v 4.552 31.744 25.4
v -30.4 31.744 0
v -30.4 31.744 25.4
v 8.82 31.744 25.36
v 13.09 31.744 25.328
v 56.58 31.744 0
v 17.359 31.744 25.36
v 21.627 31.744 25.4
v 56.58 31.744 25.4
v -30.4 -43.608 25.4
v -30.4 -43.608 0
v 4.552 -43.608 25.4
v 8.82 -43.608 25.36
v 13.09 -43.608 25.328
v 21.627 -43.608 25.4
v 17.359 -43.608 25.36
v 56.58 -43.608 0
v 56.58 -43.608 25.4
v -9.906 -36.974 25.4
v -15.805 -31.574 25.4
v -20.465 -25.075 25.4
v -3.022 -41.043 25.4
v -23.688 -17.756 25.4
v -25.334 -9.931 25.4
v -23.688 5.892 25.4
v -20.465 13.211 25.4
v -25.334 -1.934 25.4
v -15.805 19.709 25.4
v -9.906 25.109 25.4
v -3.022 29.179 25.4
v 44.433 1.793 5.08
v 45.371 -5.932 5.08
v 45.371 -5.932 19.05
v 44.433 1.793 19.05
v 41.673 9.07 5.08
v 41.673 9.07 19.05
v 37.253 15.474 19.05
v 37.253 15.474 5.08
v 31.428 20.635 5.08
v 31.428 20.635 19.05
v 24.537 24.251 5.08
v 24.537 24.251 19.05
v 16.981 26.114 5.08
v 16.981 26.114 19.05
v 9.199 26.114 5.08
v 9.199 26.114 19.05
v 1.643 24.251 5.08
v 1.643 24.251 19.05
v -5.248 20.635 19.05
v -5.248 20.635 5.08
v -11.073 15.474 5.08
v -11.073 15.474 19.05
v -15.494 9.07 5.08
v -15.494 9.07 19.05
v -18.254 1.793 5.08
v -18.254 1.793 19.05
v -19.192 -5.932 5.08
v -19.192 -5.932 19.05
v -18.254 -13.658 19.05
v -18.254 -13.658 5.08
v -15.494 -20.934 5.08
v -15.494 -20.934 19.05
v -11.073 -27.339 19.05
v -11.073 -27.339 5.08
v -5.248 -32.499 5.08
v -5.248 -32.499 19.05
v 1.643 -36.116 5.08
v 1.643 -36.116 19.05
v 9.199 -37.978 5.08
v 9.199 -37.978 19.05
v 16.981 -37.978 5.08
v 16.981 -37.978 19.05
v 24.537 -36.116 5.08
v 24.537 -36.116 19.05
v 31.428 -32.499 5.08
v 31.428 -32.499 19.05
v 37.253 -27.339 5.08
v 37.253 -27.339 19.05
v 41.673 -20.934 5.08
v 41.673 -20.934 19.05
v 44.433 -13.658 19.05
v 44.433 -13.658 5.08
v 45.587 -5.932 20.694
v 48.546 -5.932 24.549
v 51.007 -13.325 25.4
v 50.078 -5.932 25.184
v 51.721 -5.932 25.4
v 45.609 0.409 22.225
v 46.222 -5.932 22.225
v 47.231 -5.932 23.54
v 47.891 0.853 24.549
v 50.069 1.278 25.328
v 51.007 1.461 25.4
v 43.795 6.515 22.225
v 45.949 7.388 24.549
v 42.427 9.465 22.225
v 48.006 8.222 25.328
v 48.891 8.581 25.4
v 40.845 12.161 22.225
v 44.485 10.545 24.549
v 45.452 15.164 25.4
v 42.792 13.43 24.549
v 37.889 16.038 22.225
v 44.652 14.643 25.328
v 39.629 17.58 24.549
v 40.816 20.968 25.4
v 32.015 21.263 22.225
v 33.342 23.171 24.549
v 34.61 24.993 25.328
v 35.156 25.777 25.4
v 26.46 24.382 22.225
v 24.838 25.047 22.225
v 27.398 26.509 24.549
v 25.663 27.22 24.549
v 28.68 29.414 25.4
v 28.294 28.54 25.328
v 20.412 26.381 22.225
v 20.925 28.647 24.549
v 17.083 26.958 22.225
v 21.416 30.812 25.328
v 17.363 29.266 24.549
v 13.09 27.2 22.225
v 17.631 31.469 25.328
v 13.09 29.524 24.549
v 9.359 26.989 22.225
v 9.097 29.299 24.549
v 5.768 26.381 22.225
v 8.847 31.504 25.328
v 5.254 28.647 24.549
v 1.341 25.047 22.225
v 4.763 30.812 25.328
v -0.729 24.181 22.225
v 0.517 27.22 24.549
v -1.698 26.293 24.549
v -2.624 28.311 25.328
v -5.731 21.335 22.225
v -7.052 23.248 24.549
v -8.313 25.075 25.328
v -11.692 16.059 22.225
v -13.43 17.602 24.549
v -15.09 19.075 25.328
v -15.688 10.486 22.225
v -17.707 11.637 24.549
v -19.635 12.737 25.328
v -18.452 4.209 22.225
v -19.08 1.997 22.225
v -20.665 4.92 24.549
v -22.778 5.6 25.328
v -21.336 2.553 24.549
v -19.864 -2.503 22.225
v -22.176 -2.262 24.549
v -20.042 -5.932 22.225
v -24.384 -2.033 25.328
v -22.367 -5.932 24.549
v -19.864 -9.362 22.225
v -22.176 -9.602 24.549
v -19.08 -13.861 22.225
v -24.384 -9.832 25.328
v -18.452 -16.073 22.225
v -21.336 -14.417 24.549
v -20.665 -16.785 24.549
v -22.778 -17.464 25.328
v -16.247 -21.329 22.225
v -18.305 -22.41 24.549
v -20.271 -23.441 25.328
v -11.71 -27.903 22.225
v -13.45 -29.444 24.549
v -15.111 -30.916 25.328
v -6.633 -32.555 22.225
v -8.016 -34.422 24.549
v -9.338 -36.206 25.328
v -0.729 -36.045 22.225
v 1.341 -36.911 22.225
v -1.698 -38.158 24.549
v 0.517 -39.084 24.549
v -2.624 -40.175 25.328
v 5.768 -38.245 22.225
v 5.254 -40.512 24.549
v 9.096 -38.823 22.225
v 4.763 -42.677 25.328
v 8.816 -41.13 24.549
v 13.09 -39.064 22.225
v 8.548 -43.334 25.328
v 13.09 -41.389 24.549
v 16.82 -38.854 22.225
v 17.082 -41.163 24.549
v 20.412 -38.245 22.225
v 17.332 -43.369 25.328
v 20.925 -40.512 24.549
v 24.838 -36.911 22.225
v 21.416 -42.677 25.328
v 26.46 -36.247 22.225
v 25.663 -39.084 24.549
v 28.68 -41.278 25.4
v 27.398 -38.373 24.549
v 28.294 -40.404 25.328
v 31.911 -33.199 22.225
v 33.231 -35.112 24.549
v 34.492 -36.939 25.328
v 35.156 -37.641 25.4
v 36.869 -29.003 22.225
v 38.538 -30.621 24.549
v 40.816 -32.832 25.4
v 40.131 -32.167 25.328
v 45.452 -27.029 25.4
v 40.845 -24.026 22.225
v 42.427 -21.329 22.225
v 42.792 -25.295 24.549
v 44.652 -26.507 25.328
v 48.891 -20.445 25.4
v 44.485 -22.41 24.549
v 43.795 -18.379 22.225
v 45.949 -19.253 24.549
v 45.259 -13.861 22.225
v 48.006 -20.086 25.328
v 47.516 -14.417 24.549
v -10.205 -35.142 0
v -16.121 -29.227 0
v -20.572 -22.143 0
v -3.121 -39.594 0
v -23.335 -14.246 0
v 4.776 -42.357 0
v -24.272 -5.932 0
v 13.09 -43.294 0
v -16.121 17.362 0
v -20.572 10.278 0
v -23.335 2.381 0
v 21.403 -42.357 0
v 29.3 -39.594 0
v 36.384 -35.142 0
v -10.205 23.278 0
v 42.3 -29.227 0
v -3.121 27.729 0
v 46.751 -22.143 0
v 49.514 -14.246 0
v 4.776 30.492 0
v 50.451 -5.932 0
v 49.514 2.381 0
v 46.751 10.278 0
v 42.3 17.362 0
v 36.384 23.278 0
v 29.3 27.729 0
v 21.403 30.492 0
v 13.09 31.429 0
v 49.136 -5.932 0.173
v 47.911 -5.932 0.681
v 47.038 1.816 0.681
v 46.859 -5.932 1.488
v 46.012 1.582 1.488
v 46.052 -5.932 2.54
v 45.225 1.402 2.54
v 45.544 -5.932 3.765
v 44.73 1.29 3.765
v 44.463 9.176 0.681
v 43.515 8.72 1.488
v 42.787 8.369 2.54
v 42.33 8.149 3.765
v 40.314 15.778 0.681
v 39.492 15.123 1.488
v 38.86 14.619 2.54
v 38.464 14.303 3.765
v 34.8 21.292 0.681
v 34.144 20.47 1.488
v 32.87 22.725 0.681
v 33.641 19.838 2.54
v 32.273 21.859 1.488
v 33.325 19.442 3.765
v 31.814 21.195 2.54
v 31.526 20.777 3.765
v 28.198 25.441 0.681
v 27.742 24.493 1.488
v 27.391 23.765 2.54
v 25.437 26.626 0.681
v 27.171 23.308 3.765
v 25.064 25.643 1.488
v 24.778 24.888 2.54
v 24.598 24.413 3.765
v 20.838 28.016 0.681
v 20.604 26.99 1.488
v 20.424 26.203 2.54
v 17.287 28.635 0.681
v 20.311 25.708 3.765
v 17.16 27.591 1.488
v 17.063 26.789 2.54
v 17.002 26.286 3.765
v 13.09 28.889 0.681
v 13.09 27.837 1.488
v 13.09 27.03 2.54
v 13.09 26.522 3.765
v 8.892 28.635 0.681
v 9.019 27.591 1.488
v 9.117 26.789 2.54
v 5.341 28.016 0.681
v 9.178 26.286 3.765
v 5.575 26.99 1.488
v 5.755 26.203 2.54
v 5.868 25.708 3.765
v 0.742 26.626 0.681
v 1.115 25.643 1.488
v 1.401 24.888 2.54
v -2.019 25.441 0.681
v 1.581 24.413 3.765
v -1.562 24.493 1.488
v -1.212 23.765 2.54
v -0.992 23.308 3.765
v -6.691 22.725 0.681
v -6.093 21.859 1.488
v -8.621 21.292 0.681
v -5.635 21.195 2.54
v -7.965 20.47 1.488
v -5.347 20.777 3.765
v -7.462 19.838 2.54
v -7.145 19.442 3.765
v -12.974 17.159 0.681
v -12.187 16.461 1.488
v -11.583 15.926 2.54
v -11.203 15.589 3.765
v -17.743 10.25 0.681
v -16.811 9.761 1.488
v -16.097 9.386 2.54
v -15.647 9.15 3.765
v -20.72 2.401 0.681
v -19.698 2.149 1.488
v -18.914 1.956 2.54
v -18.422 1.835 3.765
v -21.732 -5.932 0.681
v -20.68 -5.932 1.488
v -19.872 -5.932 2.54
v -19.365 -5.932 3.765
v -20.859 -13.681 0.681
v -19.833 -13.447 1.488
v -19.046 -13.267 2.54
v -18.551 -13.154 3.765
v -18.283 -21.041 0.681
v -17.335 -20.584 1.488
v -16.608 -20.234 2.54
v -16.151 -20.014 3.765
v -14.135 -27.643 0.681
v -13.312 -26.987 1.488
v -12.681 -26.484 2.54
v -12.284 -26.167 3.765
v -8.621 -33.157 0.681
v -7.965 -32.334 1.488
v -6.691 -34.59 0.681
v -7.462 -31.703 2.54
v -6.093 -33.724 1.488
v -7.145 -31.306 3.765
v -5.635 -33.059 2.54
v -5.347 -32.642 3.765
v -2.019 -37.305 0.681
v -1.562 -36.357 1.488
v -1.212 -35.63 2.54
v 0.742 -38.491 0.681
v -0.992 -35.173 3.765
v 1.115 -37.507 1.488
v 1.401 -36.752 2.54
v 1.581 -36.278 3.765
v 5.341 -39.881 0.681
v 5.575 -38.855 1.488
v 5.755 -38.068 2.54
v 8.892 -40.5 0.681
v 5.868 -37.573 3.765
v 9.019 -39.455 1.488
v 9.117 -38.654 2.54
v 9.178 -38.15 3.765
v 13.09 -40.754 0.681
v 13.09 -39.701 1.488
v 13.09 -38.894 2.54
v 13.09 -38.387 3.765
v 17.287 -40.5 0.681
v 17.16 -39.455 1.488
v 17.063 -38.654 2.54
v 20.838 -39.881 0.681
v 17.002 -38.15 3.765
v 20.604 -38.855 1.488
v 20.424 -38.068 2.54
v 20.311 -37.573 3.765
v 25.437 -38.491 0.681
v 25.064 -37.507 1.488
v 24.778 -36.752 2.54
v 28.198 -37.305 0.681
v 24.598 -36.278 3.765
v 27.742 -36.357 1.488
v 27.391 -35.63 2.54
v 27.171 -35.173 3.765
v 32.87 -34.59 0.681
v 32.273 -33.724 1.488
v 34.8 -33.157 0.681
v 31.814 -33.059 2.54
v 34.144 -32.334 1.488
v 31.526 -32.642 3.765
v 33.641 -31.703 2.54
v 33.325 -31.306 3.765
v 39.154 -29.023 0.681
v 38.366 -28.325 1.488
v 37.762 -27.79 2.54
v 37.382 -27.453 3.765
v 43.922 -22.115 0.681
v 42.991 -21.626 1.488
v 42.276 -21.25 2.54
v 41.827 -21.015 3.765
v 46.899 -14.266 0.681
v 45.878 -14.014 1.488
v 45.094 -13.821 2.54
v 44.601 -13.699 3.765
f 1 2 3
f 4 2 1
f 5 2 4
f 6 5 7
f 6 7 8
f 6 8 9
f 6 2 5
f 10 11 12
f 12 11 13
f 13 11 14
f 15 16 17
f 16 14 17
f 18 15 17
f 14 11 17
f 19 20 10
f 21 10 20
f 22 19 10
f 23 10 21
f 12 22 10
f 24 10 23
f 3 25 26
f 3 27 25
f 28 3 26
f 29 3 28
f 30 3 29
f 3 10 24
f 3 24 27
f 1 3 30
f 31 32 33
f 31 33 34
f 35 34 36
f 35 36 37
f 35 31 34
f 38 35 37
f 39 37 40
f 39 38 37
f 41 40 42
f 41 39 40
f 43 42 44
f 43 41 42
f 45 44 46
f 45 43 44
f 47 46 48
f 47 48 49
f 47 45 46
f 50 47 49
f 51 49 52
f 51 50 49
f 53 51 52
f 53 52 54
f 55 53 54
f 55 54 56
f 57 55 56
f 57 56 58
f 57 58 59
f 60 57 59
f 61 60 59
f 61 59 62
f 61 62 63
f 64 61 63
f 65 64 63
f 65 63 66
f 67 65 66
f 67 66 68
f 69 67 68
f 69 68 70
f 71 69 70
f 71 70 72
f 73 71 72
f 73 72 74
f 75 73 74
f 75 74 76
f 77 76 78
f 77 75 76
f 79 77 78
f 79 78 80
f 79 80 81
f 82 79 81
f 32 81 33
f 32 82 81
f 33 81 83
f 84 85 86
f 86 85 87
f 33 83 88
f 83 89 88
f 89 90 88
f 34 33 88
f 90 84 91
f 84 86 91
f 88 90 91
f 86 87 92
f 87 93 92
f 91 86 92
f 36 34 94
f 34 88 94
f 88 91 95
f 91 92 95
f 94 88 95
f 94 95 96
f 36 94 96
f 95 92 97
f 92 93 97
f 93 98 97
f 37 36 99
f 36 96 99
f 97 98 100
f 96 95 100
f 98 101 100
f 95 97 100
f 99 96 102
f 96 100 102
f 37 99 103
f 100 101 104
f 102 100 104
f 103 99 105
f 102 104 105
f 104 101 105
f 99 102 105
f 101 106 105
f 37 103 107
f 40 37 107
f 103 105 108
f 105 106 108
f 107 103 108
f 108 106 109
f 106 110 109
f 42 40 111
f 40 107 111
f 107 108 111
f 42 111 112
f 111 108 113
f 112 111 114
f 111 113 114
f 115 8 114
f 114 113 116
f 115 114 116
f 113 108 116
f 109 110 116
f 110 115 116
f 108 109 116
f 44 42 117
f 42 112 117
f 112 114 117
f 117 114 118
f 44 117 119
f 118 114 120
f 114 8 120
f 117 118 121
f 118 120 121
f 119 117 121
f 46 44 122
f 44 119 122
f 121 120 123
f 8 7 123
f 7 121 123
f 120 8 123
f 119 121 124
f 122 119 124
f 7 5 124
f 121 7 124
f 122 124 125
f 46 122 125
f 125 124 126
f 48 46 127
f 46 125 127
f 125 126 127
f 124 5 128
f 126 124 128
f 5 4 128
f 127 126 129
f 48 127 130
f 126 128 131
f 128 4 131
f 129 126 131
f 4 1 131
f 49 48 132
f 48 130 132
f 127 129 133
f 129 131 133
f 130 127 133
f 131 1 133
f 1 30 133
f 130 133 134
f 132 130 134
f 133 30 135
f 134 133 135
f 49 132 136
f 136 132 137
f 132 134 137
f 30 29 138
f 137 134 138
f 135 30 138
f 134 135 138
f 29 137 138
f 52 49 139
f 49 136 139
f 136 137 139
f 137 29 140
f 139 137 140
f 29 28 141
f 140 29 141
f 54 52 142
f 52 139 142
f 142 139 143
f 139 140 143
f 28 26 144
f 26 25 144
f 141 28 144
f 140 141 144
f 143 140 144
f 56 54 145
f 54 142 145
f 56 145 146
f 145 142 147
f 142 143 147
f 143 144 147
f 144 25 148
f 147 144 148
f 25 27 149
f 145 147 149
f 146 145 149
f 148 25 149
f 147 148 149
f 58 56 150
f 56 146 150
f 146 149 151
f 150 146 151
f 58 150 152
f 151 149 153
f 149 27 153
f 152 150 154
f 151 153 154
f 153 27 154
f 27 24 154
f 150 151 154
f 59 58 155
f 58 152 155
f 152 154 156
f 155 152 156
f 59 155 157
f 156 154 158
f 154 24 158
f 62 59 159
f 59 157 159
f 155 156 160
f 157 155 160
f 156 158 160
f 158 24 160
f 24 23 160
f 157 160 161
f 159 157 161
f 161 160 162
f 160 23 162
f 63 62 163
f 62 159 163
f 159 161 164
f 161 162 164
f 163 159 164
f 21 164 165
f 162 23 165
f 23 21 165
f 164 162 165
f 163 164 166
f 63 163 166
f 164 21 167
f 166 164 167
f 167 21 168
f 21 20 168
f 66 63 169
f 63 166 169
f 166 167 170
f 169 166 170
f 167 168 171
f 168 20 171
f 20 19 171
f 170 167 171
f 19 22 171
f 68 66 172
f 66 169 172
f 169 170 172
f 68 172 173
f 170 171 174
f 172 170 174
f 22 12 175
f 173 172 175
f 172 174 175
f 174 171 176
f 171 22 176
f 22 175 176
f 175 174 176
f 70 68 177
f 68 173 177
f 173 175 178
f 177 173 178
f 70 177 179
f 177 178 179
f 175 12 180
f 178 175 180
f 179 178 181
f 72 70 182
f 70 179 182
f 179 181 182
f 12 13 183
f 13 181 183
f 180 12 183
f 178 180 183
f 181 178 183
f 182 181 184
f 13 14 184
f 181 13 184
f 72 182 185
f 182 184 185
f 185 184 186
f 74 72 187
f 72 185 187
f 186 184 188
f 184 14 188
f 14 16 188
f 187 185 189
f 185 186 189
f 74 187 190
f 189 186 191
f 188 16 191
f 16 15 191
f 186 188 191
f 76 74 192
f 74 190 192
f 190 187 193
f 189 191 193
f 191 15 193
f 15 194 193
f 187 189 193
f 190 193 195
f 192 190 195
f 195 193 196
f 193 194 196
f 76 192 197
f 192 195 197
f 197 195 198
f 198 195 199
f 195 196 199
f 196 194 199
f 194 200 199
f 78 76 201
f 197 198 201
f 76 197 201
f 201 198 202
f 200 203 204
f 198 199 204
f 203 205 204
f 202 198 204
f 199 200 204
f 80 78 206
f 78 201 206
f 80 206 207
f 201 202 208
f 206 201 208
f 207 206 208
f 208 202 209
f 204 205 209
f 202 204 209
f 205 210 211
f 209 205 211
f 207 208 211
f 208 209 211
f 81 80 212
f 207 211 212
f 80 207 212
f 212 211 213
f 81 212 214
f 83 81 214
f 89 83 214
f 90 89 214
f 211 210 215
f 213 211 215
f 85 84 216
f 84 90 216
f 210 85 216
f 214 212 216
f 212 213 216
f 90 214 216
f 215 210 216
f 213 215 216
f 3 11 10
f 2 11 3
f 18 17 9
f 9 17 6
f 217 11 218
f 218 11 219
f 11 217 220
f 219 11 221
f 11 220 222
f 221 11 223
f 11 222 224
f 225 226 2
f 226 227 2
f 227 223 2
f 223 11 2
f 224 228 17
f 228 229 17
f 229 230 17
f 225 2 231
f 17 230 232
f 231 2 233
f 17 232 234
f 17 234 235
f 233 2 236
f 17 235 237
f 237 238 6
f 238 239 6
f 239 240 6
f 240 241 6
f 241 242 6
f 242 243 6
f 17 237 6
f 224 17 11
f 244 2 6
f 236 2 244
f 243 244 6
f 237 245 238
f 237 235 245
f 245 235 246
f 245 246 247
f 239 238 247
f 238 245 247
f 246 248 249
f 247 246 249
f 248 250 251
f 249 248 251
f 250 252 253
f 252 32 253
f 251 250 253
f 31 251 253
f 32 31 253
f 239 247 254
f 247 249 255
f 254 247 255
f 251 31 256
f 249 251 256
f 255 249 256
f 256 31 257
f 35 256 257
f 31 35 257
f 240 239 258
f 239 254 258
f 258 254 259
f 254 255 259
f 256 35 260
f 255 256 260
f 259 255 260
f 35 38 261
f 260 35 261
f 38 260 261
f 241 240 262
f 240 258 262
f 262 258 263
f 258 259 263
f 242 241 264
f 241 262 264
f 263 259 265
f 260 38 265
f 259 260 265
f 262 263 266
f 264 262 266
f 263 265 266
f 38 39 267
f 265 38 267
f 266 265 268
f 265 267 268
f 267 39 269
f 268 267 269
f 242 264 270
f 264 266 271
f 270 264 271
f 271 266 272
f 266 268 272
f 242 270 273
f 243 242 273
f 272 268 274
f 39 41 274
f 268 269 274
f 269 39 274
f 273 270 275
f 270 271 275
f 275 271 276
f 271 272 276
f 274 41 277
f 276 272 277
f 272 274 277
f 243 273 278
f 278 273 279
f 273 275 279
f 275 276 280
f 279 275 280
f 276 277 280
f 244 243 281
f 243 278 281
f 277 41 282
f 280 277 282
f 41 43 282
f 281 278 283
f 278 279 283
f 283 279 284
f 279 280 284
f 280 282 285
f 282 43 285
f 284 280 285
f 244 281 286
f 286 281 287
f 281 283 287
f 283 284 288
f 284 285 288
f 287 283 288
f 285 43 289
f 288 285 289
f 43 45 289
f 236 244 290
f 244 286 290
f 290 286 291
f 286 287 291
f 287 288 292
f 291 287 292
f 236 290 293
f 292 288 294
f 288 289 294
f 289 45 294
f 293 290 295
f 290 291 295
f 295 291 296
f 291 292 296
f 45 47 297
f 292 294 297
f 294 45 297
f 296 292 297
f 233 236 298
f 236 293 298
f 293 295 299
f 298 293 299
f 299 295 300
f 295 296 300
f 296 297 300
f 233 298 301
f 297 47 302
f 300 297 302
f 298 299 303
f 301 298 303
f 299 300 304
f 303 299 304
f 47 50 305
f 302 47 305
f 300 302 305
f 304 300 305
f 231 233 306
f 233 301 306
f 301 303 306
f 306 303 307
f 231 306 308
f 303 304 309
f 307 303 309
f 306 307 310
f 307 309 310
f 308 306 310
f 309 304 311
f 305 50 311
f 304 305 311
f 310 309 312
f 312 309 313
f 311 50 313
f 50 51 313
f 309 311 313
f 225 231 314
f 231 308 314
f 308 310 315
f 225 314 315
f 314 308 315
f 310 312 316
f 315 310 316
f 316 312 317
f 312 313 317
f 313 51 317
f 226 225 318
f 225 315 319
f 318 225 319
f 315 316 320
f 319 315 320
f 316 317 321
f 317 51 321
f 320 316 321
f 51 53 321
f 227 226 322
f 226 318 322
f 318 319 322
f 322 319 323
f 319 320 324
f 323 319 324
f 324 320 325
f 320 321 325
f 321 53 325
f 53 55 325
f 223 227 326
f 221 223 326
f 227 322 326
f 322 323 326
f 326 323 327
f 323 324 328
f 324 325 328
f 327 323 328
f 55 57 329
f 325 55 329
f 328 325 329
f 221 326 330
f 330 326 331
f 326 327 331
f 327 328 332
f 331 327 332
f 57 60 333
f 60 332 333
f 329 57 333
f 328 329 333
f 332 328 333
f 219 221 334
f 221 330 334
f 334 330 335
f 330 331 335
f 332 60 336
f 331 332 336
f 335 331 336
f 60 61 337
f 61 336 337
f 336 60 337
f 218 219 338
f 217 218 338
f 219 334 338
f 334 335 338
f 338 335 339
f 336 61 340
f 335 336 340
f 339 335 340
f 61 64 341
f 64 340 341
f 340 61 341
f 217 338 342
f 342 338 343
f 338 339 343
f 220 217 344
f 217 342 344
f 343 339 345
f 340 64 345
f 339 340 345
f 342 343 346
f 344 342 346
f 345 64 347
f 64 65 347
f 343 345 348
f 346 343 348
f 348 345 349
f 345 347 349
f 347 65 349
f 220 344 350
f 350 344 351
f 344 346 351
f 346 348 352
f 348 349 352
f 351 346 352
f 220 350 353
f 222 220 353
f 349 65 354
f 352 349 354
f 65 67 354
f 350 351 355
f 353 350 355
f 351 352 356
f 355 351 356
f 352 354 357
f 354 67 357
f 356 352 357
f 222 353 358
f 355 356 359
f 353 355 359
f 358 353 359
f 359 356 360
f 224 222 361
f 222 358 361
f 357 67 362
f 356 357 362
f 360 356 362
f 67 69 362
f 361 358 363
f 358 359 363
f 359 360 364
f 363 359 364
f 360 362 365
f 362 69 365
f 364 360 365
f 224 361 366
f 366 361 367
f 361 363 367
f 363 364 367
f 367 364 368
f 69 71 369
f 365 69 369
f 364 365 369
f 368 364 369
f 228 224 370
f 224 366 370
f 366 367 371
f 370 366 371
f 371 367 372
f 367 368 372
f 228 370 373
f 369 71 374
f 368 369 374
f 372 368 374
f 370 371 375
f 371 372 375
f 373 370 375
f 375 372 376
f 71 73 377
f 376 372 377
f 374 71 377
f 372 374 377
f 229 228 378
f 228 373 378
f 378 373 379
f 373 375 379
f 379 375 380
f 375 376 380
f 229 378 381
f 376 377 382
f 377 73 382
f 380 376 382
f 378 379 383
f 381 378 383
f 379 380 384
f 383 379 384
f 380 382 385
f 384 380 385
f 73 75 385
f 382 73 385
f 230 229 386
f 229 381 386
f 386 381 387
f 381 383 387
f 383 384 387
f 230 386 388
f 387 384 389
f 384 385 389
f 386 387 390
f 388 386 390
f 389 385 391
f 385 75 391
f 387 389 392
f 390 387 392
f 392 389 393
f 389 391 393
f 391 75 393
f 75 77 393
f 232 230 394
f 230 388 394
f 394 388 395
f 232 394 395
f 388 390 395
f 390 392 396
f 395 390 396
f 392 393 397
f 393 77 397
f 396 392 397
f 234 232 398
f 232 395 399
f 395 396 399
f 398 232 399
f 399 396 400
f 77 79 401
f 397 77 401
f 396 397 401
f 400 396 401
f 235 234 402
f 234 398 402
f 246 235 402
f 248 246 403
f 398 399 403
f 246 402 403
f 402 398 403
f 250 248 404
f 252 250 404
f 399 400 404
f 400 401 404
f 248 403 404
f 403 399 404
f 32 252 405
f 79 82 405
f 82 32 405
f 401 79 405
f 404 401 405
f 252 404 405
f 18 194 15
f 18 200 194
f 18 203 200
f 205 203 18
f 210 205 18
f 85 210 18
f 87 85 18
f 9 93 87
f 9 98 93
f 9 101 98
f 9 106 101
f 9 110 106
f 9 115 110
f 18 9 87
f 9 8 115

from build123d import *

# Parameters (mm, degrees)
F0_W     = 86.9801938534
F0_H     = 75.3522887826
F0_R     = 32.2813153837
F1_DEPTH = 25.4
F3_R     = 5.08


# Not quite as in the source:
# - a fillet or chamfer that OpenCascade refuses, or shapes differently, is made with other operations: its cross-section is extruded or revolved along the edge and cut away or added


with BuildPart() as f1:
    # F0 (on Top) → F1 (new body)
    with BuildSketch(Plane.XY):
        with Locations((13.0896866322, -5.9322379529)):
            Rectangle(F0_W, F0_H)
        with Locations((13.0896866322, -5.9322379529)):
            Circle(F0_R, mode=Mode.SUBTRACT)
    extrude(amount=F1_DEPTH)

    # F2: fillet of radius 6.35 on 1 edges, made by hand

    # F2_s1 → F2_t2 (revolve, cut)
    with BuildSketch(Plane.XZ.offset(5.9322379529)):
        with BuildLine():
            ThreePointArc((45.3710020159, 19.05), (47.2308739553, 23.5401280605), (51.7210020159, 25.4))
            Line((51.7210020159, 25.4), (45.3710020159, 25.4))
            Line((45.3710020159, 25.4), (45.3710020159, 19.05))
        make_face()
    revolve(axis=Axis((13.0896866322, -5.9322379529, 25.4), (0, 0, 1)), mode=Mode.SUBTRACT)

    # F3
    f3_edges = [f1.edges().sort_by_distance(p)[0] for p in [
        (-19.191629, -5.932238, 0),
    ]]
    fillet(f3_edges, radius=F3_R)


solid = f1.part
